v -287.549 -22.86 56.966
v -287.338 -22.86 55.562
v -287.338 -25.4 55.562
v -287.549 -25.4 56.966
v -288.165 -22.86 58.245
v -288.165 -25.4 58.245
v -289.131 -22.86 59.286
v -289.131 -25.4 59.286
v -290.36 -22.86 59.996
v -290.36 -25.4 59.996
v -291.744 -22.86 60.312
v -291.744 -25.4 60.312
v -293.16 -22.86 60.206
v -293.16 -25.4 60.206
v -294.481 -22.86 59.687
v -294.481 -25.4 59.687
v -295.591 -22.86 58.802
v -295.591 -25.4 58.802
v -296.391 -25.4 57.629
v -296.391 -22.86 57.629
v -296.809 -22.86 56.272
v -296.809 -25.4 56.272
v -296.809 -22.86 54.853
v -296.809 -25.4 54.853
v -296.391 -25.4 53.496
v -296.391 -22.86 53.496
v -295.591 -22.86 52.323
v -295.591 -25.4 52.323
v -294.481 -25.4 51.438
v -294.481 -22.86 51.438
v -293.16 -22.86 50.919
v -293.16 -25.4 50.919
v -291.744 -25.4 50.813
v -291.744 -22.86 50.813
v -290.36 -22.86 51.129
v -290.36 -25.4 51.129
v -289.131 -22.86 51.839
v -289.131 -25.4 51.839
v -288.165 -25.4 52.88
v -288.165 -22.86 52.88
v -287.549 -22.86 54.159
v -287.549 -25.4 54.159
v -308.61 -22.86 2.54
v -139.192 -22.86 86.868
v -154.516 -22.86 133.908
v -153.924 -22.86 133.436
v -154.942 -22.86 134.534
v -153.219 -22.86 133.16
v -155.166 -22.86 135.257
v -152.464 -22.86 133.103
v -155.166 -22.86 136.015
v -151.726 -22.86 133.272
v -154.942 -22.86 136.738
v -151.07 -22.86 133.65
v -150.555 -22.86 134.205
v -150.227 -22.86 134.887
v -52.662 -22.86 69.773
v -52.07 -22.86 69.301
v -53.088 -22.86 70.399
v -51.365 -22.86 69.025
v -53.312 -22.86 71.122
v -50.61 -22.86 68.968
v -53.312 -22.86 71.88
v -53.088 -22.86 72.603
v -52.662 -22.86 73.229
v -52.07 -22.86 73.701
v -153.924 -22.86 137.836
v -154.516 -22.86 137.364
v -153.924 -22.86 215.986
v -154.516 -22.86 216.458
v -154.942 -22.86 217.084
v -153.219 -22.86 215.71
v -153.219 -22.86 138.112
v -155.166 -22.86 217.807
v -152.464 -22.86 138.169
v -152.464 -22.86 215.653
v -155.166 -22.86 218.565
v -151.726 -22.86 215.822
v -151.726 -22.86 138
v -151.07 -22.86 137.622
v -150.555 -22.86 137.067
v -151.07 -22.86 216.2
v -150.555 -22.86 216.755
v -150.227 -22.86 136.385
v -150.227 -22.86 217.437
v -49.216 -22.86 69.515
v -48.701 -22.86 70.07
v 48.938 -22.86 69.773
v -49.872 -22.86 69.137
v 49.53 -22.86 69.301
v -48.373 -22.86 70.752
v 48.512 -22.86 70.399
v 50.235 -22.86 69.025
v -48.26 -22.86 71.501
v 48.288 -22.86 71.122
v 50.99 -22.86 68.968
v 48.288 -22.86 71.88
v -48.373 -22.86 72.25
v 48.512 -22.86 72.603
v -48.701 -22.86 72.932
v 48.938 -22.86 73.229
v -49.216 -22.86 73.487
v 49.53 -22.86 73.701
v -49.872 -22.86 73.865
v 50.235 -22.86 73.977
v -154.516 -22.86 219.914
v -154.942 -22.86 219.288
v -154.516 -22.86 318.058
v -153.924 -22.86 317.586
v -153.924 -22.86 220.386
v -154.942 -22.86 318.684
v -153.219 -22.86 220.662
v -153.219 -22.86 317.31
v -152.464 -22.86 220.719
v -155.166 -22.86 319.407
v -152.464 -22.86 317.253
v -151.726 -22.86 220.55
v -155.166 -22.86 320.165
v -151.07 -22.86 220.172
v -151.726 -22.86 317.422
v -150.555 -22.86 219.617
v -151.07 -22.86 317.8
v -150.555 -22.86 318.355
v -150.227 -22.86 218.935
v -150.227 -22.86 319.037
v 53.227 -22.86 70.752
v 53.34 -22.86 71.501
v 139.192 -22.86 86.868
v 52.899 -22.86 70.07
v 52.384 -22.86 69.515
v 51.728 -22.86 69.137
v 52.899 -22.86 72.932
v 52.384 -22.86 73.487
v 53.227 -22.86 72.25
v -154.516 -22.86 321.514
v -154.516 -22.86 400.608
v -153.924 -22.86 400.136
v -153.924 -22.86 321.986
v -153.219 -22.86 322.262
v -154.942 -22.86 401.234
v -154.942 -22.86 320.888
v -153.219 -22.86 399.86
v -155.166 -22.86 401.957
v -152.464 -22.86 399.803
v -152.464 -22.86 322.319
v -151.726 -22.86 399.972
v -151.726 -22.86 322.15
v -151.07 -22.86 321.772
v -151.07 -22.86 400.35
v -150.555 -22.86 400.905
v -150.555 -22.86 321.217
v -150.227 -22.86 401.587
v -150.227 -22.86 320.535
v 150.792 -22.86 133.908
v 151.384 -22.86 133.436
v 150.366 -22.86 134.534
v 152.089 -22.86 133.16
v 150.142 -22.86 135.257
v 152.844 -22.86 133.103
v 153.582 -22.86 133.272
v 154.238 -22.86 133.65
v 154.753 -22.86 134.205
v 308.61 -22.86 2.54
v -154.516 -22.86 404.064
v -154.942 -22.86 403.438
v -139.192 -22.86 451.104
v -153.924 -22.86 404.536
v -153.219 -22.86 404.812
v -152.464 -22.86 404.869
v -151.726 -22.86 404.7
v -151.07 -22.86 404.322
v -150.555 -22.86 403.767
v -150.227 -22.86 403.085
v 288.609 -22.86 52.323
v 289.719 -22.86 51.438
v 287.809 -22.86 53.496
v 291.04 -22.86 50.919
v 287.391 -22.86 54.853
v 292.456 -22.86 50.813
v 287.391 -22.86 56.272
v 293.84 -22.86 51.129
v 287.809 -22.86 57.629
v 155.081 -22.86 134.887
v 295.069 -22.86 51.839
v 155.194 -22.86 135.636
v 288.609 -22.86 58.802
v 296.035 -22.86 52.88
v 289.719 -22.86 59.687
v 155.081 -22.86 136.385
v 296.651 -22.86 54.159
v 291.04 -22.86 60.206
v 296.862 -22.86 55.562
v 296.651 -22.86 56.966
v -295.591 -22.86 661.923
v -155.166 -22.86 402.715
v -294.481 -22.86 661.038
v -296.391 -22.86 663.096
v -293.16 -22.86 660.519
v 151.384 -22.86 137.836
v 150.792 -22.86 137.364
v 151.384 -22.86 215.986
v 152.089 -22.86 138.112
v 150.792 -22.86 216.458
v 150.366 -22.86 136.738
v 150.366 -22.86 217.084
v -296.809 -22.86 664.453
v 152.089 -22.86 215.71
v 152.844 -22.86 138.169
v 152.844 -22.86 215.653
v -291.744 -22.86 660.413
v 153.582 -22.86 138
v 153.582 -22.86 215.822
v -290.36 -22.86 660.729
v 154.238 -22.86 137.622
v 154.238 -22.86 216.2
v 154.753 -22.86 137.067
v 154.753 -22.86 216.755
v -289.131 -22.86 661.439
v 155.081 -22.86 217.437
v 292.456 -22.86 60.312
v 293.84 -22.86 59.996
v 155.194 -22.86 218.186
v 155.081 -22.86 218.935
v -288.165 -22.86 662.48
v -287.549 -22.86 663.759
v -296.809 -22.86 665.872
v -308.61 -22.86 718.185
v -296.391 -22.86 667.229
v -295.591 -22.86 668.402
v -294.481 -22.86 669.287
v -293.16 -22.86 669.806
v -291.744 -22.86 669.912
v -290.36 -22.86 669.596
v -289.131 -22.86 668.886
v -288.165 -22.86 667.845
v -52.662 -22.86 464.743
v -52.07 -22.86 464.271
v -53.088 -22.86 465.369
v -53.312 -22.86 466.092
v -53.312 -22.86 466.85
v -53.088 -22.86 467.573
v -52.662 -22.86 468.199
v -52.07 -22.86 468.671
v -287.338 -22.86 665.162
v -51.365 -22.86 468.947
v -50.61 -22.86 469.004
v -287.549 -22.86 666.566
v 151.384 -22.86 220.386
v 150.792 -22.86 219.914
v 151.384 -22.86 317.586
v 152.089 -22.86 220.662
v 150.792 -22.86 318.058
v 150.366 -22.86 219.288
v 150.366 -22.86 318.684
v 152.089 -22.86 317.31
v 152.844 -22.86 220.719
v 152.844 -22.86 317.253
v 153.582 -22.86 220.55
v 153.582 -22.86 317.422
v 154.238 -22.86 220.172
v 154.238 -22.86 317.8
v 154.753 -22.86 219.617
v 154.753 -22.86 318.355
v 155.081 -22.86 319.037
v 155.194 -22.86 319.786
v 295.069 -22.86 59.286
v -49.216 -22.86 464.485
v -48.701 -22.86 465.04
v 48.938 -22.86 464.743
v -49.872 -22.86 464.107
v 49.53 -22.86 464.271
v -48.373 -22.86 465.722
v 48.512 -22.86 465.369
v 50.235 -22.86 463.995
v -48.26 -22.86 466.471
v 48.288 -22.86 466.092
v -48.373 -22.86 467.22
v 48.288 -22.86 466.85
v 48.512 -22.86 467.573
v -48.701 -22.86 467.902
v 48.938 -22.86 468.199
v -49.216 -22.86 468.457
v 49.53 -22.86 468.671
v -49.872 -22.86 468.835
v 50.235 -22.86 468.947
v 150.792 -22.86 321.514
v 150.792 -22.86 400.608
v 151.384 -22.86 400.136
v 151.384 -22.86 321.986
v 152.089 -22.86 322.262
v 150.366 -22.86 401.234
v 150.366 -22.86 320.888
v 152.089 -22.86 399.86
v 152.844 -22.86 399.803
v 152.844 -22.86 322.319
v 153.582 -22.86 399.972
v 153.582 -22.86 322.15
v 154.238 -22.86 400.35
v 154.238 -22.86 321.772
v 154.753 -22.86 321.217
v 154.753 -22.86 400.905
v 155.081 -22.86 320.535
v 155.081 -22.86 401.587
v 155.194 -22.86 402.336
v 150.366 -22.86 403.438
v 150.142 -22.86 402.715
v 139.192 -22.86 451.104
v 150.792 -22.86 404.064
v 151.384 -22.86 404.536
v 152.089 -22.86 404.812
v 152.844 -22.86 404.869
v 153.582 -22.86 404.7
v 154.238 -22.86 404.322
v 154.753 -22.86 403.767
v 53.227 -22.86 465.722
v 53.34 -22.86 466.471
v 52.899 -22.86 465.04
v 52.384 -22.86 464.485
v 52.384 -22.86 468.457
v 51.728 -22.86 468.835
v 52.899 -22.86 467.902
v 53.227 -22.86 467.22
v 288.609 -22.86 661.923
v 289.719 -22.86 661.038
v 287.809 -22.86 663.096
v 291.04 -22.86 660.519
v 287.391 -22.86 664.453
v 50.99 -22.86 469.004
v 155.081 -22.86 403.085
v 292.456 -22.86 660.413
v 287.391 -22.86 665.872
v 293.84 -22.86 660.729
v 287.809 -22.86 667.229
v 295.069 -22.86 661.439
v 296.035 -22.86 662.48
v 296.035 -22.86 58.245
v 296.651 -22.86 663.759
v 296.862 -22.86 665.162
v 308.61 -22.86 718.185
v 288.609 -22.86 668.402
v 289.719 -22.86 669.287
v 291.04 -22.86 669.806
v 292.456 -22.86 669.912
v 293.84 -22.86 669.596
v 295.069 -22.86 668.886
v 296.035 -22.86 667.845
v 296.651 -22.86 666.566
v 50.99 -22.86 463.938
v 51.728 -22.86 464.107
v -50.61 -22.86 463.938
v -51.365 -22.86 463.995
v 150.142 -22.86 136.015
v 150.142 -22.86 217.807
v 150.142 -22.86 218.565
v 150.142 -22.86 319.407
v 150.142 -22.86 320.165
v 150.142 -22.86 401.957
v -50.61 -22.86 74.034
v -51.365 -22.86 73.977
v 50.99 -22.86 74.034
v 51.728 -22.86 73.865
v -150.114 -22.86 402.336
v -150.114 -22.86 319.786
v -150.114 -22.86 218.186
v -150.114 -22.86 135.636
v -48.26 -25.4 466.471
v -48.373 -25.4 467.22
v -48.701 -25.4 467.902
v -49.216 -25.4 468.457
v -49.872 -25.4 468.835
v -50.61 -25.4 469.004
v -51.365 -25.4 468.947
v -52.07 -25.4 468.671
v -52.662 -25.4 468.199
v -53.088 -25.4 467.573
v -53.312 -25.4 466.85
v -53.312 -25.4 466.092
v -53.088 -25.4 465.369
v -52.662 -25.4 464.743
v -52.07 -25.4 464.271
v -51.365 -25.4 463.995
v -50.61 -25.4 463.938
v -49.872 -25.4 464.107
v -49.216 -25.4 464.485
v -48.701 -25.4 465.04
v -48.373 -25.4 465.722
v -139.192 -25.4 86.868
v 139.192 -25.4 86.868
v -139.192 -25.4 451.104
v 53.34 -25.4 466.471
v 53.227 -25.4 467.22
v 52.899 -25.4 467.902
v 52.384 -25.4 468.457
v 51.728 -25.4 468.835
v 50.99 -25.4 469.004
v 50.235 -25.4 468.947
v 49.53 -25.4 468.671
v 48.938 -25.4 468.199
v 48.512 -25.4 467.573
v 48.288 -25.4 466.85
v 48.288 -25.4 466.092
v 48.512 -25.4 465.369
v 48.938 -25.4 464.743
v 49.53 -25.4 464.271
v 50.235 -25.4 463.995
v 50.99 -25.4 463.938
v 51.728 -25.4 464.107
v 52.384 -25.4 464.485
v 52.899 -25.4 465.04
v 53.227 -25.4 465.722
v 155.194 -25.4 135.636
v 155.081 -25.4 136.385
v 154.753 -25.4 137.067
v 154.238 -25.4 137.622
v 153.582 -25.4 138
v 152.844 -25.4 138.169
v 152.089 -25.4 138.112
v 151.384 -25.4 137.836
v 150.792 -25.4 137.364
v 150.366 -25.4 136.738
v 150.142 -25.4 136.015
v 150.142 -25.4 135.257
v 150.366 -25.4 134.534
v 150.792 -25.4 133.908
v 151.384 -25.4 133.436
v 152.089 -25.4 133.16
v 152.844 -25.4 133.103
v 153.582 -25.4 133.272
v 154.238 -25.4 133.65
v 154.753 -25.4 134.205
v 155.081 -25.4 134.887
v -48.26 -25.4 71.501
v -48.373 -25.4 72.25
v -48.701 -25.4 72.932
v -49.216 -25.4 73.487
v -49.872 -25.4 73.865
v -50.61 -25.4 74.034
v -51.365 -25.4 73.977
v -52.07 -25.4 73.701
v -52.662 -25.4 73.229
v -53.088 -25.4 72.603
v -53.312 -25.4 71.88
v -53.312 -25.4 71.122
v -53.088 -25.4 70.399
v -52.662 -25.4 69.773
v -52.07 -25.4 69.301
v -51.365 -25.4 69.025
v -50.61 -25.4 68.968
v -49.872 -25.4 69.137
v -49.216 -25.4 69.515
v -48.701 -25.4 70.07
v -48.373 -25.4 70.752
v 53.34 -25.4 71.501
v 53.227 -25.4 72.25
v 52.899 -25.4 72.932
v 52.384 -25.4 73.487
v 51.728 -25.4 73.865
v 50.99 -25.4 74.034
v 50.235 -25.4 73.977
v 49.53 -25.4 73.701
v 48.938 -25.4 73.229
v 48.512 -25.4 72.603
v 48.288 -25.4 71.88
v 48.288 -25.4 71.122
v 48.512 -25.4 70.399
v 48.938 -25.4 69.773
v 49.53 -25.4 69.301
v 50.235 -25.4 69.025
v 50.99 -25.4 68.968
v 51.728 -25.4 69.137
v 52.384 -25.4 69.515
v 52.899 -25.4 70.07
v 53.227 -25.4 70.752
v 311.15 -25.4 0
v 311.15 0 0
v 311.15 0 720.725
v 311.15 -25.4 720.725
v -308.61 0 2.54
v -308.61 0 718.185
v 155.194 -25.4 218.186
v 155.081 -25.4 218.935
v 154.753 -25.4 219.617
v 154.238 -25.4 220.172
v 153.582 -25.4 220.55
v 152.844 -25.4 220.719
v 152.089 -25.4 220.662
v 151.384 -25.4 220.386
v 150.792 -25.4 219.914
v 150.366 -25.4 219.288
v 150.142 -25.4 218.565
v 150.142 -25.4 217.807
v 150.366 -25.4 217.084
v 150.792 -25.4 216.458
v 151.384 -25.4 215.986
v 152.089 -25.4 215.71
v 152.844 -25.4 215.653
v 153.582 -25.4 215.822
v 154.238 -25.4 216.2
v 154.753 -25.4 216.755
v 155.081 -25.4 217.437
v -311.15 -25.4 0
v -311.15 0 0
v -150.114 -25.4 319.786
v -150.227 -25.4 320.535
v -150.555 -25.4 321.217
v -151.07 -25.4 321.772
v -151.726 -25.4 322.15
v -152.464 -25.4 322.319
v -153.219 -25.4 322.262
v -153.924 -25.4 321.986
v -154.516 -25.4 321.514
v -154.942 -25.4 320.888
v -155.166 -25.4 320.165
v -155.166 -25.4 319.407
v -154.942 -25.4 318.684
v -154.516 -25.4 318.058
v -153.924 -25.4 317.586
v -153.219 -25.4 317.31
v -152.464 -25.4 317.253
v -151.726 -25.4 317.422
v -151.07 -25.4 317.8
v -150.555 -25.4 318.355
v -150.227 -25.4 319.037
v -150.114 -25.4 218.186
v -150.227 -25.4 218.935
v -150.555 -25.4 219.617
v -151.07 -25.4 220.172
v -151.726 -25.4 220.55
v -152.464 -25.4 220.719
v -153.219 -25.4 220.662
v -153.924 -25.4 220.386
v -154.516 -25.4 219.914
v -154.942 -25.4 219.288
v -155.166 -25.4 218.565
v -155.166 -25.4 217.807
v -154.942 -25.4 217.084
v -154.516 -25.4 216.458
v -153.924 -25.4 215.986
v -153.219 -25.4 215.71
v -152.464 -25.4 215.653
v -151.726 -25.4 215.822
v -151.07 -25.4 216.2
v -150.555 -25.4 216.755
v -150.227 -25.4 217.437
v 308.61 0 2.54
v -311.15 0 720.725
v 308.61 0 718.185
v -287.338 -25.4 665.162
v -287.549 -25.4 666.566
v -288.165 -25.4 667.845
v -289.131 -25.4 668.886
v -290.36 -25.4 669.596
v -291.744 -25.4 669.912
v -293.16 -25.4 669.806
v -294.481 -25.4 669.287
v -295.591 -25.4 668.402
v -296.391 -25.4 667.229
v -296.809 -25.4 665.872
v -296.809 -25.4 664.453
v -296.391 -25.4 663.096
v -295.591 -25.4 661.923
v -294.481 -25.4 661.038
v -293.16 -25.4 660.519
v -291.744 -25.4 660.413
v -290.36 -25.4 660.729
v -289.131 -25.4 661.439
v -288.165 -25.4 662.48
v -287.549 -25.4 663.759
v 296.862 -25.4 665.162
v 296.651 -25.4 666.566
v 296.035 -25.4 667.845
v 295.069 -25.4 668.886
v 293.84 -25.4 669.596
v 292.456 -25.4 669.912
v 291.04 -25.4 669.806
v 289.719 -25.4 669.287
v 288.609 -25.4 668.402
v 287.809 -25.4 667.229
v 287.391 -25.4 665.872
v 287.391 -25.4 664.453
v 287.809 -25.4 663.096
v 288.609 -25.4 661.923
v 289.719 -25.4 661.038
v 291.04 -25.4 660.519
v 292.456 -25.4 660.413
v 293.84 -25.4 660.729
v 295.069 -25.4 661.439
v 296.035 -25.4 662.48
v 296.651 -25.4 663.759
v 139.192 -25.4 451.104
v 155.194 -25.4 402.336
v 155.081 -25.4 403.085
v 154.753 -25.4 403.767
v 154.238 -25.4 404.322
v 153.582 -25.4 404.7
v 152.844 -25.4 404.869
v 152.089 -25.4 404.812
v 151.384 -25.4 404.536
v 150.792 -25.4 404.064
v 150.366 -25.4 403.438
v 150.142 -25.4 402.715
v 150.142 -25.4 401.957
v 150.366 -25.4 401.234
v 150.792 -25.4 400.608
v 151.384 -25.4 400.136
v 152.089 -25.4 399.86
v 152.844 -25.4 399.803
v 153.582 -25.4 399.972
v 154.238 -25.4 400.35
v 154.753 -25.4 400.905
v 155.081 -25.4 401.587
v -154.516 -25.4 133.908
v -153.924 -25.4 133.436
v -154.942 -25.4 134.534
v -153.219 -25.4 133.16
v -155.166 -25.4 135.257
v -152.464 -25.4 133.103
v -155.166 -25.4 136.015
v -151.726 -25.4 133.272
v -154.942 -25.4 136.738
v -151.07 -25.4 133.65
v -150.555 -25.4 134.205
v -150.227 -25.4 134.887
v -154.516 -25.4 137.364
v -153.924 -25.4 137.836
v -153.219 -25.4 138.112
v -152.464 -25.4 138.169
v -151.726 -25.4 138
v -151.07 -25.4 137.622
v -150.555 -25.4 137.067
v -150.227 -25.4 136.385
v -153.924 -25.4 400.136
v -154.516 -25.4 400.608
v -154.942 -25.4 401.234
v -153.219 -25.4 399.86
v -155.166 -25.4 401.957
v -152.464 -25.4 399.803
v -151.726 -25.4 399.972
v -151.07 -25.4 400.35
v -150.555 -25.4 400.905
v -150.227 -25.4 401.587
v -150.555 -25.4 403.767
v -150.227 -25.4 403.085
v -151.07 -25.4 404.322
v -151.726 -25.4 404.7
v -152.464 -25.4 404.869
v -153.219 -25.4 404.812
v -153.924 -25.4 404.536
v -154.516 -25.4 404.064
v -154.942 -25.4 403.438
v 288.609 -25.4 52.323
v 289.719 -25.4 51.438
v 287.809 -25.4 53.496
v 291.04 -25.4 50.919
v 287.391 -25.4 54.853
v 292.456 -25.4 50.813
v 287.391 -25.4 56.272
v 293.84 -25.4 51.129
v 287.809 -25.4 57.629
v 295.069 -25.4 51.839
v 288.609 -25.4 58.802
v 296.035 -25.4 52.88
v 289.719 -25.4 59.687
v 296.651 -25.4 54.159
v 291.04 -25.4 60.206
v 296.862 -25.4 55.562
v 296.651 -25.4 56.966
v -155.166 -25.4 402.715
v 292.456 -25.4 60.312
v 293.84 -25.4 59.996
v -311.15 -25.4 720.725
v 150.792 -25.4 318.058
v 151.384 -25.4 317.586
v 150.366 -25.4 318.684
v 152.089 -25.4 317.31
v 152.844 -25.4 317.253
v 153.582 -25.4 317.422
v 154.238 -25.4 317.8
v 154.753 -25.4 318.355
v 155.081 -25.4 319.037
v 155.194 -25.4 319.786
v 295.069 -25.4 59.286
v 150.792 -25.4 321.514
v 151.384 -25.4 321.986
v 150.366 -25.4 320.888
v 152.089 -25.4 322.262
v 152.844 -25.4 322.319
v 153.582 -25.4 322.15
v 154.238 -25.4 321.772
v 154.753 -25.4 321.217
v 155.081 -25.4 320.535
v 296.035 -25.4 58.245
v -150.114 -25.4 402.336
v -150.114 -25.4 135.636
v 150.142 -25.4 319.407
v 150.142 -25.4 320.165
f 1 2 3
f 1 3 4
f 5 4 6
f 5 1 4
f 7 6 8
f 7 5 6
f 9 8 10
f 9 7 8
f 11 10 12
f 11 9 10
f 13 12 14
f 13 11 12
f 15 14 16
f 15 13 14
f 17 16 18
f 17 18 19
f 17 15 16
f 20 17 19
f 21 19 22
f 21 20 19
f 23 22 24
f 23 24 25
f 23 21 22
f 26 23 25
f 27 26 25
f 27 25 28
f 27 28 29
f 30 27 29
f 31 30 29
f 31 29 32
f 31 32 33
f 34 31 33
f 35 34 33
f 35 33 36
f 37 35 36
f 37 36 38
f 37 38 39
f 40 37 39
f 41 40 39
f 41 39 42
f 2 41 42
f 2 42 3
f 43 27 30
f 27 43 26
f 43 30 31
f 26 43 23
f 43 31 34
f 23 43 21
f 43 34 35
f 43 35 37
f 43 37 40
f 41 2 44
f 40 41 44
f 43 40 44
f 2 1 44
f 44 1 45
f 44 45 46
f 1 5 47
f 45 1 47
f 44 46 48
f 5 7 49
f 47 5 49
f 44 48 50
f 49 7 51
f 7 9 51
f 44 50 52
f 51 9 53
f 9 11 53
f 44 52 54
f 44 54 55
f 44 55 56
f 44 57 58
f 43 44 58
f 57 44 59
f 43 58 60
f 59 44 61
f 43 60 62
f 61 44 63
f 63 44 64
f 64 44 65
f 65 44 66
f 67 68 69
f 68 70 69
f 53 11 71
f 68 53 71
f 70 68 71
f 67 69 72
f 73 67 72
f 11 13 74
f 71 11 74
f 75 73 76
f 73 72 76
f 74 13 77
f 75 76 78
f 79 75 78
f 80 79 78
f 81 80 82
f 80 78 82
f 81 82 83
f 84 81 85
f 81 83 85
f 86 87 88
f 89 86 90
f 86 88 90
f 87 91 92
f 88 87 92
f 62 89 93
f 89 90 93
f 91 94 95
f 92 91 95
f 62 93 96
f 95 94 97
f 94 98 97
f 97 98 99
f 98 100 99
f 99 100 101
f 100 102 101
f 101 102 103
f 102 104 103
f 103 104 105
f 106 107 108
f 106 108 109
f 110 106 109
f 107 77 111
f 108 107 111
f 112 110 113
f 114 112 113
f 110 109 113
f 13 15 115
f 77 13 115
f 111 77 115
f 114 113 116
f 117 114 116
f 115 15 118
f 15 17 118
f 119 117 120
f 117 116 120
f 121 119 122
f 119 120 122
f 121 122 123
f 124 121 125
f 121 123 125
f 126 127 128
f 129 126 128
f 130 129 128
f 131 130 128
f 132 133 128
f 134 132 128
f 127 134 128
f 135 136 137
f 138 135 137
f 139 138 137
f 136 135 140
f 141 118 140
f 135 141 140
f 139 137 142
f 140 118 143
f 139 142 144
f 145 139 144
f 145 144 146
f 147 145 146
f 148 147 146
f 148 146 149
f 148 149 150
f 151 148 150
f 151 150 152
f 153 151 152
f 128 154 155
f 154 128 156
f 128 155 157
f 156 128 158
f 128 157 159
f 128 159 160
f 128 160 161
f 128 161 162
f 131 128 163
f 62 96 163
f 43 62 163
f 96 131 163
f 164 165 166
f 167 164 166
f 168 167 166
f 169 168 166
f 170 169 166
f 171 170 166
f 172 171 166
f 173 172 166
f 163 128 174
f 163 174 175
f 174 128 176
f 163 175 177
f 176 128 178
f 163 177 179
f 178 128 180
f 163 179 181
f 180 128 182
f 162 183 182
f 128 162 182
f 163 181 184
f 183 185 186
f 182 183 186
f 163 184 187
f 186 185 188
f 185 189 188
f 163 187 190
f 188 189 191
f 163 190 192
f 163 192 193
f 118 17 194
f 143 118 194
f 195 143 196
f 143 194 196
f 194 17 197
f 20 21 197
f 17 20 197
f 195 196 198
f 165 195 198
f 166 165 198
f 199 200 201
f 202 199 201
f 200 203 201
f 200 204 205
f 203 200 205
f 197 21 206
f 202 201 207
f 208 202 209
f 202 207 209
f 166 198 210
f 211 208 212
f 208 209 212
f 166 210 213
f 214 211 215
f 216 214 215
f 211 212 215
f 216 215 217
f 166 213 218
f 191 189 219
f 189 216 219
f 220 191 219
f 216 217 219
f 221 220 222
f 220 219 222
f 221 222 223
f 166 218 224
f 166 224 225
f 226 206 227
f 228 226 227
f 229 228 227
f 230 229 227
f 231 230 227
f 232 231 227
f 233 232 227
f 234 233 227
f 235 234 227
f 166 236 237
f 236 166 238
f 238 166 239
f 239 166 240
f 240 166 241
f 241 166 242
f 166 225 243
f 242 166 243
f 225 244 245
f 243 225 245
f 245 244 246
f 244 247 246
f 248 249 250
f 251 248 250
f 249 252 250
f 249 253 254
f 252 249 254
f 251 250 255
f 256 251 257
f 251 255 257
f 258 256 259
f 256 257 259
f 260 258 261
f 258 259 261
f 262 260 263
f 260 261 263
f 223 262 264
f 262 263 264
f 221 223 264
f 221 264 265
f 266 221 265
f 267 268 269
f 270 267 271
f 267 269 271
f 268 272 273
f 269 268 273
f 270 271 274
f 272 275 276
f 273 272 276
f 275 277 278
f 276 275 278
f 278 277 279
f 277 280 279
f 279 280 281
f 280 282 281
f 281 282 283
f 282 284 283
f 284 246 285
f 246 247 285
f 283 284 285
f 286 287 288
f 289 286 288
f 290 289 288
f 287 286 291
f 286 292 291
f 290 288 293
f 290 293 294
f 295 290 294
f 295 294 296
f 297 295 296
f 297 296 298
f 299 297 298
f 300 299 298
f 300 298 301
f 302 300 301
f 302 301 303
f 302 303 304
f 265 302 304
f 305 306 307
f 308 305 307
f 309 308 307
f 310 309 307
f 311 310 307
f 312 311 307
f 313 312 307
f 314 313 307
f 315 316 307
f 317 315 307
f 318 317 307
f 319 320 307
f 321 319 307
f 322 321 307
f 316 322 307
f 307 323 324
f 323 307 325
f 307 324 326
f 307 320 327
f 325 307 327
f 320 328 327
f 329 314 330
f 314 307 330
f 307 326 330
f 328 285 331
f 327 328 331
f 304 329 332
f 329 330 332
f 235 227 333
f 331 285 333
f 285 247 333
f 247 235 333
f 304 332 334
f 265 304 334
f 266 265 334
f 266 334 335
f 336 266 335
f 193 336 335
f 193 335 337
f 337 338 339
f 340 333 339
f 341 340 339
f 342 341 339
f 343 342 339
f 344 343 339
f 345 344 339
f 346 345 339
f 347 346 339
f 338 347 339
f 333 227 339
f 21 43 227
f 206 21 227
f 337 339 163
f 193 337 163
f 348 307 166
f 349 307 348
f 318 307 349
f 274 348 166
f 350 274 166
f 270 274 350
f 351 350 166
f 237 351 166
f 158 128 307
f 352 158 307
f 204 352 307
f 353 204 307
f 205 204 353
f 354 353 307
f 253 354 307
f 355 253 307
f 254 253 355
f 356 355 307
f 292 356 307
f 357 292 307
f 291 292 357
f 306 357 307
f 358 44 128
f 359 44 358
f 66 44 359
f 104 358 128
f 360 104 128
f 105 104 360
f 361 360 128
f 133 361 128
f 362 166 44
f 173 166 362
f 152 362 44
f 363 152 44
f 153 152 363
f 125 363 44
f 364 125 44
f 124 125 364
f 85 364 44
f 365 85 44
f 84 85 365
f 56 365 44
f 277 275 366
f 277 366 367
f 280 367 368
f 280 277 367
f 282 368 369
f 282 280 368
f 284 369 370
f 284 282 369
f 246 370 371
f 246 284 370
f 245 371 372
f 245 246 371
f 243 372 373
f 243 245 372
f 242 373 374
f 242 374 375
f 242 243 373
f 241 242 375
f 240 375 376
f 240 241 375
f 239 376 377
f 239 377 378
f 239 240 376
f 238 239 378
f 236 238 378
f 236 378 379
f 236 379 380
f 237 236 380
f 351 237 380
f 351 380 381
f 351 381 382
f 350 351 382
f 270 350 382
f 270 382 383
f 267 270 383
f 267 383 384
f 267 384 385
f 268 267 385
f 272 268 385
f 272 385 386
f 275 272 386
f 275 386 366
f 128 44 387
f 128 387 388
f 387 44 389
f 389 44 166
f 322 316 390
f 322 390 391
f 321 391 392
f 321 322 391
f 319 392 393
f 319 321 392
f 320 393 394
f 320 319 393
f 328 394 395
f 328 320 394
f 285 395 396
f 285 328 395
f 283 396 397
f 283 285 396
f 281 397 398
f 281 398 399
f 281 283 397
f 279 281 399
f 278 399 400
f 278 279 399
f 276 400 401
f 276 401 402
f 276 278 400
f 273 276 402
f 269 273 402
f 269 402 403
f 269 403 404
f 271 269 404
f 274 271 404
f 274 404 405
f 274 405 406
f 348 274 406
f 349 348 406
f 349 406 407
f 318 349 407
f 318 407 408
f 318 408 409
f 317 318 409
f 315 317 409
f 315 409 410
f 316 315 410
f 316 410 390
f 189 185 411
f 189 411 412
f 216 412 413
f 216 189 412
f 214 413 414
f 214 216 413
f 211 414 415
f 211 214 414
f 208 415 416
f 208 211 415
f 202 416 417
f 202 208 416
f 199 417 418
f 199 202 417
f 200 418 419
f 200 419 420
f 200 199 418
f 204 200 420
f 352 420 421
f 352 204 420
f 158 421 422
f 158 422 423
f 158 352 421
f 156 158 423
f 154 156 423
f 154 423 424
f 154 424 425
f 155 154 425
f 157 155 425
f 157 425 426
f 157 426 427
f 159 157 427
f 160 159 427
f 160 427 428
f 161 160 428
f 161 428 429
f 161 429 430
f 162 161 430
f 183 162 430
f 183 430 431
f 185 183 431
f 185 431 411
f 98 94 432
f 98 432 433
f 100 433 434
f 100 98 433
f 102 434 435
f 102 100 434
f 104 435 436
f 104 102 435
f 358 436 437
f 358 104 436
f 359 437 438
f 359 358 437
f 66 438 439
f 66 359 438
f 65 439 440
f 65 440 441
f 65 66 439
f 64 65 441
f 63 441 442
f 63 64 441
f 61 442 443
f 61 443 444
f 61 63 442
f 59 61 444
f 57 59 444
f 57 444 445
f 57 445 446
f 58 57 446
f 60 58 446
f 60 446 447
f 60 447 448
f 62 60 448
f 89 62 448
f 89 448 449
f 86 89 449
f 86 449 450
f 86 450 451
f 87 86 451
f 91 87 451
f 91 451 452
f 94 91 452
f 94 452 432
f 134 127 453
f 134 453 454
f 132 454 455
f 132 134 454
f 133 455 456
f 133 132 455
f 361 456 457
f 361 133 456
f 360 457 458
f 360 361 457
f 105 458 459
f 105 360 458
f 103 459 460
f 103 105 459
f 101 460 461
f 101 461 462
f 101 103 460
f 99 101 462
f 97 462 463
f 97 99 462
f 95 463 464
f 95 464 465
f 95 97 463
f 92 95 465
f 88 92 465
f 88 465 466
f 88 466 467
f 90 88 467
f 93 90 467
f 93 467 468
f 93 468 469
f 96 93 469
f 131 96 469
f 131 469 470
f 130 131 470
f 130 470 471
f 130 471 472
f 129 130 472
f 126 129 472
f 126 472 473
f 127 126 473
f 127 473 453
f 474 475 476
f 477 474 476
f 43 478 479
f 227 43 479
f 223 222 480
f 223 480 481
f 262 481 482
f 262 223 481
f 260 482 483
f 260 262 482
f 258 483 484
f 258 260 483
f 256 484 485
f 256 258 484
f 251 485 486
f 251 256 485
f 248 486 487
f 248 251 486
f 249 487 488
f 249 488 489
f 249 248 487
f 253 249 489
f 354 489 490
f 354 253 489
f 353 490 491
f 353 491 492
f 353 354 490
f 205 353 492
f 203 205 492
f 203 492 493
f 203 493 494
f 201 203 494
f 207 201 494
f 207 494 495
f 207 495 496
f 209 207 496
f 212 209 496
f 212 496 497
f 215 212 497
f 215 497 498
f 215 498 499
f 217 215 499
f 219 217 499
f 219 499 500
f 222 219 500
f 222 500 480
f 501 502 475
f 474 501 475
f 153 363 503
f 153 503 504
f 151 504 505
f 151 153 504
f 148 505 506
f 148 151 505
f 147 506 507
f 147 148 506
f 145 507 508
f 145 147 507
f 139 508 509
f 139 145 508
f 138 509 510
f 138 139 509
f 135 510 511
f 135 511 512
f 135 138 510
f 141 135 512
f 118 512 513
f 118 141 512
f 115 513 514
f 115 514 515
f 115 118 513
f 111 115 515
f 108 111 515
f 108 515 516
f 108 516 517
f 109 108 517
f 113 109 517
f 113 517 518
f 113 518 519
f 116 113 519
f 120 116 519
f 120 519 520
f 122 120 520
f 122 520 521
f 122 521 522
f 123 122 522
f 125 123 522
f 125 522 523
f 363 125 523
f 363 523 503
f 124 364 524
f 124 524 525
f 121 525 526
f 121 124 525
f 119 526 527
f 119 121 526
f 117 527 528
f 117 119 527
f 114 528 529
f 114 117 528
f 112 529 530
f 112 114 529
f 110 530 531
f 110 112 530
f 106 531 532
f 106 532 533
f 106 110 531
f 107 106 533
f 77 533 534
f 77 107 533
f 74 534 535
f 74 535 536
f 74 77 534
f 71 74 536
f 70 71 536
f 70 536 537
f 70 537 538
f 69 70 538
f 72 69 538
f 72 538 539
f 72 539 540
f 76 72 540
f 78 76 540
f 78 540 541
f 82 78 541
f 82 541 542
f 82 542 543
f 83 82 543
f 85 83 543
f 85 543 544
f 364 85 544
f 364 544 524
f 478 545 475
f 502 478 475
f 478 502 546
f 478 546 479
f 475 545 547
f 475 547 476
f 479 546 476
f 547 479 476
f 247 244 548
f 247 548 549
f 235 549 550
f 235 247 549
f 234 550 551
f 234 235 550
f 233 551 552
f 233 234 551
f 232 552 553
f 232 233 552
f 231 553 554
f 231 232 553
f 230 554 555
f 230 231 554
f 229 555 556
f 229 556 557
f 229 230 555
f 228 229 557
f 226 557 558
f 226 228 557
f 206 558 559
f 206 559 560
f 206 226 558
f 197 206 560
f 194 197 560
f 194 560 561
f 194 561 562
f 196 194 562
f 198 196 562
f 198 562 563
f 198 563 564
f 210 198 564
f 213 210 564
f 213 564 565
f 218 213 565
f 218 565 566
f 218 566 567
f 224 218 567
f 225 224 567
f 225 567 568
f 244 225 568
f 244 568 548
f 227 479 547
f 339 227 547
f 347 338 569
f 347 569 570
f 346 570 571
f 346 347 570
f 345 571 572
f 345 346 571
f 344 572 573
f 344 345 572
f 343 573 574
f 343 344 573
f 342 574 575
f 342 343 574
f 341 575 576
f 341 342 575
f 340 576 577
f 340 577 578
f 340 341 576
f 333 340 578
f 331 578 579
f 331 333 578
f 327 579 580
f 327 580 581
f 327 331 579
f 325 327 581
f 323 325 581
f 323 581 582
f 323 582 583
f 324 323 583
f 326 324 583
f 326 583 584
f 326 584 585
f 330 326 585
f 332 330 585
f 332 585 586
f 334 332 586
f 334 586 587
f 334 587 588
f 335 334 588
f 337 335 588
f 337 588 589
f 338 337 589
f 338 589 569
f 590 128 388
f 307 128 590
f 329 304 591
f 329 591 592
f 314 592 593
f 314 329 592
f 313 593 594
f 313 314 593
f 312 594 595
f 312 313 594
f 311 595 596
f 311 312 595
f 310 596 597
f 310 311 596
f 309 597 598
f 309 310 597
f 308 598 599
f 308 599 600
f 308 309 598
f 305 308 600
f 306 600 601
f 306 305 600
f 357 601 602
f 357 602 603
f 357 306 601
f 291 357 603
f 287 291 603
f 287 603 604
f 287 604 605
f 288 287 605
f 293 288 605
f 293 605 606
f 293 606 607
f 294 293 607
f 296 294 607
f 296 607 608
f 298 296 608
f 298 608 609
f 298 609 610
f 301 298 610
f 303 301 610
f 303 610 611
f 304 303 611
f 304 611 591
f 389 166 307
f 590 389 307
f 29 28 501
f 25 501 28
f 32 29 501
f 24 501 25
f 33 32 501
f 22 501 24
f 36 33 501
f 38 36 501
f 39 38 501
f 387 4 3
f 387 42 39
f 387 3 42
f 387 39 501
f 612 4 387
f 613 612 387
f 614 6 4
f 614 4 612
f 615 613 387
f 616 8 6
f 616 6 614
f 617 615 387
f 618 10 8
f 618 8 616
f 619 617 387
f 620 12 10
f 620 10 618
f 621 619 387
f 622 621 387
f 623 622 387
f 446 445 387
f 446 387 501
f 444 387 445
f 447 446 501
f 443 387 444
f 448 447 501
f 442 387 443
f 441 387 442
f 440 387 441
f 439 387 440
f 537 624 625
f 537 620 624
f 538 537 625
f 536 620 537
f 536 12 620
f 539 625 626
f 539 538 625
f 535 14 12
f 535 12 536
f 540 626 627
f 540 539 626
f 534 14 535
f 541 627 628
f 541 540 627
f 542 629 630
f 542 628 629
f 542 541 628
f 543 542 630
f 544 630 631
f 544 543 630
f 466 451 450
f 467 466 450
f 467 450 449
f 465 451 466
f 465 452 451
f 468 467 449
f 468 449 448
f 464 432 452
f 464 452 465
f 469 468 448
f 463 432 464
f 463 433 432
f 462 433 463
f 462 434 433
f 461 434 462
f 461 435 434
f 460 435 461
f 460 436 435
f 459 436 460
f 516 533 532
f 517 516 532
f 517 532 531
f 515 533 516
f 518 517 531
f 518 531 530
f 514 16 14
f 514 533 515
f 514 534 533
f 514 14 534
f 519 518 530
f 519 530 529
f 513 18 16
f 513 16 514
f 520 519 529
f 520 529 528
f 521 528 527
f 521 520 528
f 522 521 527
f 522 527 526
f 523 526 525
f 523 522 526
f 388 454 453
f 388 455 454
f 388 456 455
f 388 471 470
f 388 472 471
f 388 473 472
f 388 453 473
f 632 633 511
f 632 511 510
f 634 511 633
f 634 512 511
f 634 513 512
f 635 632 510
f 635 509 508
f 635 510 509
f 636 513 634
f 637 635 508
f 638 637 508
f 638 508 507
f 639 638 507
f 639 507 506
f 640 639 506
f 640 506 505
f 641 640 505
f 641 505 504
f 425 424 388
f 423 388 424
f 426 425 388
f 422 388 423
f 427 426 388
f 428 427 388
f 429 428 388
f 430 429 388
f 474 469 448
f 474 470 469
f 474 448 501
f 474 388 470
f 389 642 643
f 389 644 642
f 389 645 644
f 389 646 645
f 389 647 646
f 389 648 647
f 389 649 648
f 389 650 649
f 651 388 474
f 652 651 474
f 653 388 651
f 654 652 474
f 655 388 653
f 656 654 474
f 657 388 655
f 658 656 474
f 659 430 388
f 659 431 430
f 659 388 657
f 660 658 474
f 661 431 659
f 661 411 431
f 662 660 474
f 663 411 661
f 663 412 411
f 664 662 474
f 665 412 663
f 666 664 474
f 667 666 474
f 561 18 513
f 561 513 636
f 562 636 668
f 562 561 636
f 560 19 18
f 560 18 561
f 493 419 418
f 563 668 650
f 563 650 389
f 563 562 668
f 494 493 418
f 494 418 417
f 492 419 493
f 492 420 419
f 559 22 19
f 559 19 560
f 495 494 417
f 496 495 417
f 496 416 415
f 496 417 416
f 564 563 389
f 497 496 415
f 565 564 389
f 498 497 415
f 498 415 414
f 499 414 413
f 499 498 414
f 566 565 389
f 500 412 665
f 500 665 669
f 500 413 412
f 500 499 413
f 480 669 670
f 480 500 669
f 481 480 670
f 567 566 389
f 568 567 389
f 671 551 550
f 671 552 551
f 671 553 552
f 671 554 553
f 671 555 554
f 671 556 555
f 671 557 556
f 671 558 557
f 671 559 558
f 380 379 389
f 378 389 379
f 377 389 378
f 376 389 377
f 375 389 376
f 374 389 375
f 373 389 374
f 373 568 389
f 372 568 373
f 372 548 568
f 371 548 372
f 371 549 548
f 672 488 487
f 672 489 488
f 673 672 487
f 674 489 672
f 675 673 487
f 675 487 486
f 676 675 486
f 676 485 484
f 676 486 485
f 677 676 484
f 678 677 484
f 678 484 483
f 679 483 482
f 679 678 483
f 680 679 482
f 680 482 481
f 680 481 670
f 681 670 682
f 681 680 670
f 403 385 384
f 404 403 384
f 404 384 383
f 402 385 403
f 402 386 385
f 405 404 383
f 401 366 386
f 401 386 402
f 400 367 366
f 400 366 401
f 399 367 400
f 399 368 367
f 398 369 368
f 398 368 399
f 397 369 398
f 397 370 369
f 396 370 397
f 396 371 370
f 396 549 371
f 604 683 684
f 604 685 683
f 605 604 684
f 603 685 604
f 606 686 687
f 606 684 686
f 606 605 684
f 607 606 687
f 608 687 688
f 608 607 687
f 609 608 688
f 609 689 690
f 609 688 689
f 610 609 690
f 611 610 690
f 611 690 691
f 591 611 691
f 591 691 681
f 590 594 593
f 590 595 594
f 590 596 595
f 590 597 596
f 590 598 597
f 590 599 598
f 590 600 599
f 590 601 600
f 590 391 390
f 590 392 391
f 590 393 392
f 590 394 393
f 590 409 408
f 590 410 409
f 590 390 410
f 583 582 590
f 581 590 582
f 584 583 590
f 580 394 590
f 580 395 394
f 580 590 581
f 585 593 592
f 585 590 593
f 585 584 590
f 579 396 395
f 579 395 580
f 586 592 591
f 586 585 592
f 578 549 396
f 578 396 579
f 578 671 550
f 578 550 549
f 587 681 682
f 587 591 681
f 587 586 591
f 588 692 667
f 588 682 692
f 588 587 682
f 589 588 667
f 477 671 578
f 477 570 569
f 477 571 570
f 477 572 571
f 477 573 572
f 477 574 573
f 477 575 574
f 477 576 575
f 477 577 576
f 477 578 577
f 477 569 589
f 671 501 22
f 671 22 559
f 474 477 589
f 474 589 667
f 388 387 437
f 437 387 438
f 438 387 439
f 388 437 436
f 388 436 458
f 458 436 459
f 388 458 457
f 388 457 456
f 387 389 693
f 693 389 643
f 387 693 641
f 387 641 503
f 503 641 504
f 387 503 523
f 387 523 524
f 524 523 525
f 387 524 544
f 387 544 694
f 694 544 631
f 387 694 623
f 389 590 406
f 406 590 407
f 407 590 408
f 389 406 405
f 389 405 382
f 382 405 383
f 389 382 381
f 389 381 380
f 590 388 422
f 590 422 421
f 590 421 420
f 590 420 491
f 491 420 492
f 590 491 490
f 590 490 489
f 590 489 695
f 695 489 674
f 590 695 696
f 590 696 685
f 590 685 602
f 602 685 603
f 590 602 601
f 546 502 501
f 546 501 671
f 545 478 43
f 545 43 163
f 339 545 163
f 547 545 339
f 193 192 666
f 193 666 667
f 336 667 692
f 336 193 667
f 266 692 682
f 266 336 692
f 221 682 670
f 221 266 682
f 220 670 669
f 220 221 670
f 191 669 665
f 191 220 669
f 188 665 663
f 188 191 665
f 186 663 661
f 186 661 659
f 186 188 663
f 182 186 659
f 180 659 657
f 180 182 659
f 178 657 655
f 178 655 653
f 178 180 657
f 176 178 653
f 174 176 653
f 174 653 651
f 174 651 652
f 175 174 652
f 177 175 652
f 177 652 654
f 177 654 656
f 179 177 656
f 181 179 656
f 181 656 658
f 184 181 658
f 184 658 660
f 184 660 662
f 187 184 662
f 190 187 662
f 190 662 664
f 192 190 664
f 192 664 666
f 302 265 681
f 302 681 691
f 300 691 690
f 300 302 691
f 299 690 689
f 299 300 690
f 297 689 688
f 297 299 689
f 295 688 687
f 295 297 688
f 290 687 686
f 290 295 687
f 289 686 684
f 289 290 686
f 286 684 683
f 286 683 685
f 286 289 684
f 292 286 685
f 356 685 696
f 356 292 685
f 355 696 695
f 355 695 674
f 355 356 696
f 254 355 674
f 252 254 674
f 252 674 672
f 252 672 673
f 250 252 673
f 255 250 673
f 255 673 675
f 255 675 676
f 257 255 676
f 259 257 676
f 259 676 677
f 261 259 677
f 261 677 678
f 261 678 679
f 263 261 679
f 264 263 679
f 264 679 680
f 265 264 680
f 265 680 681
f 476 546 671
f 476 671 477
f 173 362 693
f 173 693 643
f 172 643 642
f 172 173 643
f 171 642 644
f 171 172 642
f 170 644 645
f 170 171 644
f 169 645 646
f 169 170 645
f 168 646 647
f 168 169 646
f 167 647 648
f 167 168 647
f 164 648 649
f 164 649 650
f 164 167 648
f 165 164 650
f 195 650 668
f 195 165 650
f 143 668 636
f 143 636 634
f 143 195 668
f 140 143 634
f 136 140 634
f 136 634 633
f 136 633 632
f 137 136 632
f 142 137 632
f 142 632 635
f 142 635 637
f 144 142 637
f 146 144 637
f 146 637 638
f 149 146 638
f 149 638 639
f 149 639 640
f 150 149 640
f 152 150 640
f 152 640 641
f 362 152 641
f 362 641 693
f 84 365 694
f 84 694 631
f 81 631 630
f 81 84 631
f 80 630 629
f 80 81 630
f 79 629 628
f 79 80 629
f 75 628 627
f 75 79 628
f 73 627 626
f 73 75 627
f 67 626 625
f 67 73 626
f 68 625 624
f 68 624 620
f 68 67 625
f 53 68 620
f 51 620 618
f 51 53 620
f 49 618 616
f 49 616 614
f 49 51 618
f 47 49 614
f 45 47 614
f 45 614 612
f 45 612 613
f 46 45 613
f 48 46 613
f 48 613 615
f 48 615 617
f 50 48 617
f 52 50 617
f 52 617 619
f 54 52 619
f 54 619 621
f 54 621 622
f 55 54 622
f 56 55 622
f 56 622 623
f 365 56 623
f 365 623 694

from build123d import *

# Parameters (mm, degrees)
F0_W     = 622.3
F0_H     = 720.725
F0_R     = 4.7625
F0_R_2   = 2.54
F0_W_2   = 278.384
F0_H_2   = 364.236
F1_DEPTH = 25.4
F2_T     = -2.54
F3_W     = 617.22
F3_H     = 22.86
F4_DEPTH = 715.645


with BuildPart() as f1:
    # F0 (on Front) → F1 (new body)
    with BuildSketch(Plane.XZ):
        with Locations((0, 360.3625)):
            Rectangle(F0_W, F0_H)
        with Locations((-292.1, 55.5625)):
            Circle(F0_R, mode=Mode.SUBTRACT)
        with Locations((-50.8, 71.501)):
            Circle(F0_R_2, mode=Mode.SUBTRACT)
        with Locations((-152.654, 135.636)):
            Circle(F0_R_2, mode=Mode.SUBTRACT)
        with Locations((-152.654, 218.186)):
            Circle(F0_R_2, mode=Mode.SUBTRACT)
        with Locations((-152.654, 319.786)):
            Circle(F0_R_2, mode=Mode.SUBTRACT)
        with Locations((50.8, 71.501)):
            Circle(F0_R_2, mode=Mode.SUBTRACT)
        with Locations((152.654, 135.636)):
            Circle(F0_R_2, mode=Mode.SUBTRACT)
        with Locations((292.1, 55.5625)):
            Circle(F0_R, mode=Mode.SUBTRACT)
        with Locations((0, 268.986)):
            Rectangle(F0_W_2, F0_H_2, mode=Mode.SUBTRACT)
        with Locations((152.654, 218.186)):
            Circle(F0_R_2, mode=Mode.SUBTRACT)
        with Locations((152.654, 319.786)):
            Circle(F0_R_2, mode=Mode.SUBTRACT)
        with Locations((-152.654, 402.336)):
            Circle(F0_R_2, mode=Mode.SUBTRACT)
        with Locations((-50.8, 466.471)):
            Circle(F0_R_2, mode=Mode.SUBTRACT)
        with Locations((-292.1, 665.1625)):
            Circle(F0_R, mode=Mode.SUBTRACT)
        with Locations((152.654, 402.336)):
            Circle(F0_R_2, mode=Mode.SUBTRACT)
        with Locations((50.8, 466.471)):
            Circle(F0_R_2, mode=Mode.SUBTRACT)
        with Locations((292.1, 665.1625)):
            Circle(F0_R, mode=Mode.SUBTRACT)
    extrude(amount=F1_DEPTH)

    # F2
    f2_openings = [f1.faces().sort_by_distance(p)[0] for p in [
        (301.627911, 0, 360.3625),
    ]]
    offset(amount=F2_T, openings=f2_openings, kind=Kind.INTERSECTION)

    # F3 (on face) → F4 (cut, through all)
    with BuildSketch(Plane(origin=(0, 0, 718.185), x_dir=(1, 0, 0), z_dir=(0, 0, -1))):
        with Locations((0, 11.43)):
            Rectangle(F3_W, F3_H)
    extrude(amount=F4_DEPTH, mode=Mode.SUBTRACT)


solid = f1.part
